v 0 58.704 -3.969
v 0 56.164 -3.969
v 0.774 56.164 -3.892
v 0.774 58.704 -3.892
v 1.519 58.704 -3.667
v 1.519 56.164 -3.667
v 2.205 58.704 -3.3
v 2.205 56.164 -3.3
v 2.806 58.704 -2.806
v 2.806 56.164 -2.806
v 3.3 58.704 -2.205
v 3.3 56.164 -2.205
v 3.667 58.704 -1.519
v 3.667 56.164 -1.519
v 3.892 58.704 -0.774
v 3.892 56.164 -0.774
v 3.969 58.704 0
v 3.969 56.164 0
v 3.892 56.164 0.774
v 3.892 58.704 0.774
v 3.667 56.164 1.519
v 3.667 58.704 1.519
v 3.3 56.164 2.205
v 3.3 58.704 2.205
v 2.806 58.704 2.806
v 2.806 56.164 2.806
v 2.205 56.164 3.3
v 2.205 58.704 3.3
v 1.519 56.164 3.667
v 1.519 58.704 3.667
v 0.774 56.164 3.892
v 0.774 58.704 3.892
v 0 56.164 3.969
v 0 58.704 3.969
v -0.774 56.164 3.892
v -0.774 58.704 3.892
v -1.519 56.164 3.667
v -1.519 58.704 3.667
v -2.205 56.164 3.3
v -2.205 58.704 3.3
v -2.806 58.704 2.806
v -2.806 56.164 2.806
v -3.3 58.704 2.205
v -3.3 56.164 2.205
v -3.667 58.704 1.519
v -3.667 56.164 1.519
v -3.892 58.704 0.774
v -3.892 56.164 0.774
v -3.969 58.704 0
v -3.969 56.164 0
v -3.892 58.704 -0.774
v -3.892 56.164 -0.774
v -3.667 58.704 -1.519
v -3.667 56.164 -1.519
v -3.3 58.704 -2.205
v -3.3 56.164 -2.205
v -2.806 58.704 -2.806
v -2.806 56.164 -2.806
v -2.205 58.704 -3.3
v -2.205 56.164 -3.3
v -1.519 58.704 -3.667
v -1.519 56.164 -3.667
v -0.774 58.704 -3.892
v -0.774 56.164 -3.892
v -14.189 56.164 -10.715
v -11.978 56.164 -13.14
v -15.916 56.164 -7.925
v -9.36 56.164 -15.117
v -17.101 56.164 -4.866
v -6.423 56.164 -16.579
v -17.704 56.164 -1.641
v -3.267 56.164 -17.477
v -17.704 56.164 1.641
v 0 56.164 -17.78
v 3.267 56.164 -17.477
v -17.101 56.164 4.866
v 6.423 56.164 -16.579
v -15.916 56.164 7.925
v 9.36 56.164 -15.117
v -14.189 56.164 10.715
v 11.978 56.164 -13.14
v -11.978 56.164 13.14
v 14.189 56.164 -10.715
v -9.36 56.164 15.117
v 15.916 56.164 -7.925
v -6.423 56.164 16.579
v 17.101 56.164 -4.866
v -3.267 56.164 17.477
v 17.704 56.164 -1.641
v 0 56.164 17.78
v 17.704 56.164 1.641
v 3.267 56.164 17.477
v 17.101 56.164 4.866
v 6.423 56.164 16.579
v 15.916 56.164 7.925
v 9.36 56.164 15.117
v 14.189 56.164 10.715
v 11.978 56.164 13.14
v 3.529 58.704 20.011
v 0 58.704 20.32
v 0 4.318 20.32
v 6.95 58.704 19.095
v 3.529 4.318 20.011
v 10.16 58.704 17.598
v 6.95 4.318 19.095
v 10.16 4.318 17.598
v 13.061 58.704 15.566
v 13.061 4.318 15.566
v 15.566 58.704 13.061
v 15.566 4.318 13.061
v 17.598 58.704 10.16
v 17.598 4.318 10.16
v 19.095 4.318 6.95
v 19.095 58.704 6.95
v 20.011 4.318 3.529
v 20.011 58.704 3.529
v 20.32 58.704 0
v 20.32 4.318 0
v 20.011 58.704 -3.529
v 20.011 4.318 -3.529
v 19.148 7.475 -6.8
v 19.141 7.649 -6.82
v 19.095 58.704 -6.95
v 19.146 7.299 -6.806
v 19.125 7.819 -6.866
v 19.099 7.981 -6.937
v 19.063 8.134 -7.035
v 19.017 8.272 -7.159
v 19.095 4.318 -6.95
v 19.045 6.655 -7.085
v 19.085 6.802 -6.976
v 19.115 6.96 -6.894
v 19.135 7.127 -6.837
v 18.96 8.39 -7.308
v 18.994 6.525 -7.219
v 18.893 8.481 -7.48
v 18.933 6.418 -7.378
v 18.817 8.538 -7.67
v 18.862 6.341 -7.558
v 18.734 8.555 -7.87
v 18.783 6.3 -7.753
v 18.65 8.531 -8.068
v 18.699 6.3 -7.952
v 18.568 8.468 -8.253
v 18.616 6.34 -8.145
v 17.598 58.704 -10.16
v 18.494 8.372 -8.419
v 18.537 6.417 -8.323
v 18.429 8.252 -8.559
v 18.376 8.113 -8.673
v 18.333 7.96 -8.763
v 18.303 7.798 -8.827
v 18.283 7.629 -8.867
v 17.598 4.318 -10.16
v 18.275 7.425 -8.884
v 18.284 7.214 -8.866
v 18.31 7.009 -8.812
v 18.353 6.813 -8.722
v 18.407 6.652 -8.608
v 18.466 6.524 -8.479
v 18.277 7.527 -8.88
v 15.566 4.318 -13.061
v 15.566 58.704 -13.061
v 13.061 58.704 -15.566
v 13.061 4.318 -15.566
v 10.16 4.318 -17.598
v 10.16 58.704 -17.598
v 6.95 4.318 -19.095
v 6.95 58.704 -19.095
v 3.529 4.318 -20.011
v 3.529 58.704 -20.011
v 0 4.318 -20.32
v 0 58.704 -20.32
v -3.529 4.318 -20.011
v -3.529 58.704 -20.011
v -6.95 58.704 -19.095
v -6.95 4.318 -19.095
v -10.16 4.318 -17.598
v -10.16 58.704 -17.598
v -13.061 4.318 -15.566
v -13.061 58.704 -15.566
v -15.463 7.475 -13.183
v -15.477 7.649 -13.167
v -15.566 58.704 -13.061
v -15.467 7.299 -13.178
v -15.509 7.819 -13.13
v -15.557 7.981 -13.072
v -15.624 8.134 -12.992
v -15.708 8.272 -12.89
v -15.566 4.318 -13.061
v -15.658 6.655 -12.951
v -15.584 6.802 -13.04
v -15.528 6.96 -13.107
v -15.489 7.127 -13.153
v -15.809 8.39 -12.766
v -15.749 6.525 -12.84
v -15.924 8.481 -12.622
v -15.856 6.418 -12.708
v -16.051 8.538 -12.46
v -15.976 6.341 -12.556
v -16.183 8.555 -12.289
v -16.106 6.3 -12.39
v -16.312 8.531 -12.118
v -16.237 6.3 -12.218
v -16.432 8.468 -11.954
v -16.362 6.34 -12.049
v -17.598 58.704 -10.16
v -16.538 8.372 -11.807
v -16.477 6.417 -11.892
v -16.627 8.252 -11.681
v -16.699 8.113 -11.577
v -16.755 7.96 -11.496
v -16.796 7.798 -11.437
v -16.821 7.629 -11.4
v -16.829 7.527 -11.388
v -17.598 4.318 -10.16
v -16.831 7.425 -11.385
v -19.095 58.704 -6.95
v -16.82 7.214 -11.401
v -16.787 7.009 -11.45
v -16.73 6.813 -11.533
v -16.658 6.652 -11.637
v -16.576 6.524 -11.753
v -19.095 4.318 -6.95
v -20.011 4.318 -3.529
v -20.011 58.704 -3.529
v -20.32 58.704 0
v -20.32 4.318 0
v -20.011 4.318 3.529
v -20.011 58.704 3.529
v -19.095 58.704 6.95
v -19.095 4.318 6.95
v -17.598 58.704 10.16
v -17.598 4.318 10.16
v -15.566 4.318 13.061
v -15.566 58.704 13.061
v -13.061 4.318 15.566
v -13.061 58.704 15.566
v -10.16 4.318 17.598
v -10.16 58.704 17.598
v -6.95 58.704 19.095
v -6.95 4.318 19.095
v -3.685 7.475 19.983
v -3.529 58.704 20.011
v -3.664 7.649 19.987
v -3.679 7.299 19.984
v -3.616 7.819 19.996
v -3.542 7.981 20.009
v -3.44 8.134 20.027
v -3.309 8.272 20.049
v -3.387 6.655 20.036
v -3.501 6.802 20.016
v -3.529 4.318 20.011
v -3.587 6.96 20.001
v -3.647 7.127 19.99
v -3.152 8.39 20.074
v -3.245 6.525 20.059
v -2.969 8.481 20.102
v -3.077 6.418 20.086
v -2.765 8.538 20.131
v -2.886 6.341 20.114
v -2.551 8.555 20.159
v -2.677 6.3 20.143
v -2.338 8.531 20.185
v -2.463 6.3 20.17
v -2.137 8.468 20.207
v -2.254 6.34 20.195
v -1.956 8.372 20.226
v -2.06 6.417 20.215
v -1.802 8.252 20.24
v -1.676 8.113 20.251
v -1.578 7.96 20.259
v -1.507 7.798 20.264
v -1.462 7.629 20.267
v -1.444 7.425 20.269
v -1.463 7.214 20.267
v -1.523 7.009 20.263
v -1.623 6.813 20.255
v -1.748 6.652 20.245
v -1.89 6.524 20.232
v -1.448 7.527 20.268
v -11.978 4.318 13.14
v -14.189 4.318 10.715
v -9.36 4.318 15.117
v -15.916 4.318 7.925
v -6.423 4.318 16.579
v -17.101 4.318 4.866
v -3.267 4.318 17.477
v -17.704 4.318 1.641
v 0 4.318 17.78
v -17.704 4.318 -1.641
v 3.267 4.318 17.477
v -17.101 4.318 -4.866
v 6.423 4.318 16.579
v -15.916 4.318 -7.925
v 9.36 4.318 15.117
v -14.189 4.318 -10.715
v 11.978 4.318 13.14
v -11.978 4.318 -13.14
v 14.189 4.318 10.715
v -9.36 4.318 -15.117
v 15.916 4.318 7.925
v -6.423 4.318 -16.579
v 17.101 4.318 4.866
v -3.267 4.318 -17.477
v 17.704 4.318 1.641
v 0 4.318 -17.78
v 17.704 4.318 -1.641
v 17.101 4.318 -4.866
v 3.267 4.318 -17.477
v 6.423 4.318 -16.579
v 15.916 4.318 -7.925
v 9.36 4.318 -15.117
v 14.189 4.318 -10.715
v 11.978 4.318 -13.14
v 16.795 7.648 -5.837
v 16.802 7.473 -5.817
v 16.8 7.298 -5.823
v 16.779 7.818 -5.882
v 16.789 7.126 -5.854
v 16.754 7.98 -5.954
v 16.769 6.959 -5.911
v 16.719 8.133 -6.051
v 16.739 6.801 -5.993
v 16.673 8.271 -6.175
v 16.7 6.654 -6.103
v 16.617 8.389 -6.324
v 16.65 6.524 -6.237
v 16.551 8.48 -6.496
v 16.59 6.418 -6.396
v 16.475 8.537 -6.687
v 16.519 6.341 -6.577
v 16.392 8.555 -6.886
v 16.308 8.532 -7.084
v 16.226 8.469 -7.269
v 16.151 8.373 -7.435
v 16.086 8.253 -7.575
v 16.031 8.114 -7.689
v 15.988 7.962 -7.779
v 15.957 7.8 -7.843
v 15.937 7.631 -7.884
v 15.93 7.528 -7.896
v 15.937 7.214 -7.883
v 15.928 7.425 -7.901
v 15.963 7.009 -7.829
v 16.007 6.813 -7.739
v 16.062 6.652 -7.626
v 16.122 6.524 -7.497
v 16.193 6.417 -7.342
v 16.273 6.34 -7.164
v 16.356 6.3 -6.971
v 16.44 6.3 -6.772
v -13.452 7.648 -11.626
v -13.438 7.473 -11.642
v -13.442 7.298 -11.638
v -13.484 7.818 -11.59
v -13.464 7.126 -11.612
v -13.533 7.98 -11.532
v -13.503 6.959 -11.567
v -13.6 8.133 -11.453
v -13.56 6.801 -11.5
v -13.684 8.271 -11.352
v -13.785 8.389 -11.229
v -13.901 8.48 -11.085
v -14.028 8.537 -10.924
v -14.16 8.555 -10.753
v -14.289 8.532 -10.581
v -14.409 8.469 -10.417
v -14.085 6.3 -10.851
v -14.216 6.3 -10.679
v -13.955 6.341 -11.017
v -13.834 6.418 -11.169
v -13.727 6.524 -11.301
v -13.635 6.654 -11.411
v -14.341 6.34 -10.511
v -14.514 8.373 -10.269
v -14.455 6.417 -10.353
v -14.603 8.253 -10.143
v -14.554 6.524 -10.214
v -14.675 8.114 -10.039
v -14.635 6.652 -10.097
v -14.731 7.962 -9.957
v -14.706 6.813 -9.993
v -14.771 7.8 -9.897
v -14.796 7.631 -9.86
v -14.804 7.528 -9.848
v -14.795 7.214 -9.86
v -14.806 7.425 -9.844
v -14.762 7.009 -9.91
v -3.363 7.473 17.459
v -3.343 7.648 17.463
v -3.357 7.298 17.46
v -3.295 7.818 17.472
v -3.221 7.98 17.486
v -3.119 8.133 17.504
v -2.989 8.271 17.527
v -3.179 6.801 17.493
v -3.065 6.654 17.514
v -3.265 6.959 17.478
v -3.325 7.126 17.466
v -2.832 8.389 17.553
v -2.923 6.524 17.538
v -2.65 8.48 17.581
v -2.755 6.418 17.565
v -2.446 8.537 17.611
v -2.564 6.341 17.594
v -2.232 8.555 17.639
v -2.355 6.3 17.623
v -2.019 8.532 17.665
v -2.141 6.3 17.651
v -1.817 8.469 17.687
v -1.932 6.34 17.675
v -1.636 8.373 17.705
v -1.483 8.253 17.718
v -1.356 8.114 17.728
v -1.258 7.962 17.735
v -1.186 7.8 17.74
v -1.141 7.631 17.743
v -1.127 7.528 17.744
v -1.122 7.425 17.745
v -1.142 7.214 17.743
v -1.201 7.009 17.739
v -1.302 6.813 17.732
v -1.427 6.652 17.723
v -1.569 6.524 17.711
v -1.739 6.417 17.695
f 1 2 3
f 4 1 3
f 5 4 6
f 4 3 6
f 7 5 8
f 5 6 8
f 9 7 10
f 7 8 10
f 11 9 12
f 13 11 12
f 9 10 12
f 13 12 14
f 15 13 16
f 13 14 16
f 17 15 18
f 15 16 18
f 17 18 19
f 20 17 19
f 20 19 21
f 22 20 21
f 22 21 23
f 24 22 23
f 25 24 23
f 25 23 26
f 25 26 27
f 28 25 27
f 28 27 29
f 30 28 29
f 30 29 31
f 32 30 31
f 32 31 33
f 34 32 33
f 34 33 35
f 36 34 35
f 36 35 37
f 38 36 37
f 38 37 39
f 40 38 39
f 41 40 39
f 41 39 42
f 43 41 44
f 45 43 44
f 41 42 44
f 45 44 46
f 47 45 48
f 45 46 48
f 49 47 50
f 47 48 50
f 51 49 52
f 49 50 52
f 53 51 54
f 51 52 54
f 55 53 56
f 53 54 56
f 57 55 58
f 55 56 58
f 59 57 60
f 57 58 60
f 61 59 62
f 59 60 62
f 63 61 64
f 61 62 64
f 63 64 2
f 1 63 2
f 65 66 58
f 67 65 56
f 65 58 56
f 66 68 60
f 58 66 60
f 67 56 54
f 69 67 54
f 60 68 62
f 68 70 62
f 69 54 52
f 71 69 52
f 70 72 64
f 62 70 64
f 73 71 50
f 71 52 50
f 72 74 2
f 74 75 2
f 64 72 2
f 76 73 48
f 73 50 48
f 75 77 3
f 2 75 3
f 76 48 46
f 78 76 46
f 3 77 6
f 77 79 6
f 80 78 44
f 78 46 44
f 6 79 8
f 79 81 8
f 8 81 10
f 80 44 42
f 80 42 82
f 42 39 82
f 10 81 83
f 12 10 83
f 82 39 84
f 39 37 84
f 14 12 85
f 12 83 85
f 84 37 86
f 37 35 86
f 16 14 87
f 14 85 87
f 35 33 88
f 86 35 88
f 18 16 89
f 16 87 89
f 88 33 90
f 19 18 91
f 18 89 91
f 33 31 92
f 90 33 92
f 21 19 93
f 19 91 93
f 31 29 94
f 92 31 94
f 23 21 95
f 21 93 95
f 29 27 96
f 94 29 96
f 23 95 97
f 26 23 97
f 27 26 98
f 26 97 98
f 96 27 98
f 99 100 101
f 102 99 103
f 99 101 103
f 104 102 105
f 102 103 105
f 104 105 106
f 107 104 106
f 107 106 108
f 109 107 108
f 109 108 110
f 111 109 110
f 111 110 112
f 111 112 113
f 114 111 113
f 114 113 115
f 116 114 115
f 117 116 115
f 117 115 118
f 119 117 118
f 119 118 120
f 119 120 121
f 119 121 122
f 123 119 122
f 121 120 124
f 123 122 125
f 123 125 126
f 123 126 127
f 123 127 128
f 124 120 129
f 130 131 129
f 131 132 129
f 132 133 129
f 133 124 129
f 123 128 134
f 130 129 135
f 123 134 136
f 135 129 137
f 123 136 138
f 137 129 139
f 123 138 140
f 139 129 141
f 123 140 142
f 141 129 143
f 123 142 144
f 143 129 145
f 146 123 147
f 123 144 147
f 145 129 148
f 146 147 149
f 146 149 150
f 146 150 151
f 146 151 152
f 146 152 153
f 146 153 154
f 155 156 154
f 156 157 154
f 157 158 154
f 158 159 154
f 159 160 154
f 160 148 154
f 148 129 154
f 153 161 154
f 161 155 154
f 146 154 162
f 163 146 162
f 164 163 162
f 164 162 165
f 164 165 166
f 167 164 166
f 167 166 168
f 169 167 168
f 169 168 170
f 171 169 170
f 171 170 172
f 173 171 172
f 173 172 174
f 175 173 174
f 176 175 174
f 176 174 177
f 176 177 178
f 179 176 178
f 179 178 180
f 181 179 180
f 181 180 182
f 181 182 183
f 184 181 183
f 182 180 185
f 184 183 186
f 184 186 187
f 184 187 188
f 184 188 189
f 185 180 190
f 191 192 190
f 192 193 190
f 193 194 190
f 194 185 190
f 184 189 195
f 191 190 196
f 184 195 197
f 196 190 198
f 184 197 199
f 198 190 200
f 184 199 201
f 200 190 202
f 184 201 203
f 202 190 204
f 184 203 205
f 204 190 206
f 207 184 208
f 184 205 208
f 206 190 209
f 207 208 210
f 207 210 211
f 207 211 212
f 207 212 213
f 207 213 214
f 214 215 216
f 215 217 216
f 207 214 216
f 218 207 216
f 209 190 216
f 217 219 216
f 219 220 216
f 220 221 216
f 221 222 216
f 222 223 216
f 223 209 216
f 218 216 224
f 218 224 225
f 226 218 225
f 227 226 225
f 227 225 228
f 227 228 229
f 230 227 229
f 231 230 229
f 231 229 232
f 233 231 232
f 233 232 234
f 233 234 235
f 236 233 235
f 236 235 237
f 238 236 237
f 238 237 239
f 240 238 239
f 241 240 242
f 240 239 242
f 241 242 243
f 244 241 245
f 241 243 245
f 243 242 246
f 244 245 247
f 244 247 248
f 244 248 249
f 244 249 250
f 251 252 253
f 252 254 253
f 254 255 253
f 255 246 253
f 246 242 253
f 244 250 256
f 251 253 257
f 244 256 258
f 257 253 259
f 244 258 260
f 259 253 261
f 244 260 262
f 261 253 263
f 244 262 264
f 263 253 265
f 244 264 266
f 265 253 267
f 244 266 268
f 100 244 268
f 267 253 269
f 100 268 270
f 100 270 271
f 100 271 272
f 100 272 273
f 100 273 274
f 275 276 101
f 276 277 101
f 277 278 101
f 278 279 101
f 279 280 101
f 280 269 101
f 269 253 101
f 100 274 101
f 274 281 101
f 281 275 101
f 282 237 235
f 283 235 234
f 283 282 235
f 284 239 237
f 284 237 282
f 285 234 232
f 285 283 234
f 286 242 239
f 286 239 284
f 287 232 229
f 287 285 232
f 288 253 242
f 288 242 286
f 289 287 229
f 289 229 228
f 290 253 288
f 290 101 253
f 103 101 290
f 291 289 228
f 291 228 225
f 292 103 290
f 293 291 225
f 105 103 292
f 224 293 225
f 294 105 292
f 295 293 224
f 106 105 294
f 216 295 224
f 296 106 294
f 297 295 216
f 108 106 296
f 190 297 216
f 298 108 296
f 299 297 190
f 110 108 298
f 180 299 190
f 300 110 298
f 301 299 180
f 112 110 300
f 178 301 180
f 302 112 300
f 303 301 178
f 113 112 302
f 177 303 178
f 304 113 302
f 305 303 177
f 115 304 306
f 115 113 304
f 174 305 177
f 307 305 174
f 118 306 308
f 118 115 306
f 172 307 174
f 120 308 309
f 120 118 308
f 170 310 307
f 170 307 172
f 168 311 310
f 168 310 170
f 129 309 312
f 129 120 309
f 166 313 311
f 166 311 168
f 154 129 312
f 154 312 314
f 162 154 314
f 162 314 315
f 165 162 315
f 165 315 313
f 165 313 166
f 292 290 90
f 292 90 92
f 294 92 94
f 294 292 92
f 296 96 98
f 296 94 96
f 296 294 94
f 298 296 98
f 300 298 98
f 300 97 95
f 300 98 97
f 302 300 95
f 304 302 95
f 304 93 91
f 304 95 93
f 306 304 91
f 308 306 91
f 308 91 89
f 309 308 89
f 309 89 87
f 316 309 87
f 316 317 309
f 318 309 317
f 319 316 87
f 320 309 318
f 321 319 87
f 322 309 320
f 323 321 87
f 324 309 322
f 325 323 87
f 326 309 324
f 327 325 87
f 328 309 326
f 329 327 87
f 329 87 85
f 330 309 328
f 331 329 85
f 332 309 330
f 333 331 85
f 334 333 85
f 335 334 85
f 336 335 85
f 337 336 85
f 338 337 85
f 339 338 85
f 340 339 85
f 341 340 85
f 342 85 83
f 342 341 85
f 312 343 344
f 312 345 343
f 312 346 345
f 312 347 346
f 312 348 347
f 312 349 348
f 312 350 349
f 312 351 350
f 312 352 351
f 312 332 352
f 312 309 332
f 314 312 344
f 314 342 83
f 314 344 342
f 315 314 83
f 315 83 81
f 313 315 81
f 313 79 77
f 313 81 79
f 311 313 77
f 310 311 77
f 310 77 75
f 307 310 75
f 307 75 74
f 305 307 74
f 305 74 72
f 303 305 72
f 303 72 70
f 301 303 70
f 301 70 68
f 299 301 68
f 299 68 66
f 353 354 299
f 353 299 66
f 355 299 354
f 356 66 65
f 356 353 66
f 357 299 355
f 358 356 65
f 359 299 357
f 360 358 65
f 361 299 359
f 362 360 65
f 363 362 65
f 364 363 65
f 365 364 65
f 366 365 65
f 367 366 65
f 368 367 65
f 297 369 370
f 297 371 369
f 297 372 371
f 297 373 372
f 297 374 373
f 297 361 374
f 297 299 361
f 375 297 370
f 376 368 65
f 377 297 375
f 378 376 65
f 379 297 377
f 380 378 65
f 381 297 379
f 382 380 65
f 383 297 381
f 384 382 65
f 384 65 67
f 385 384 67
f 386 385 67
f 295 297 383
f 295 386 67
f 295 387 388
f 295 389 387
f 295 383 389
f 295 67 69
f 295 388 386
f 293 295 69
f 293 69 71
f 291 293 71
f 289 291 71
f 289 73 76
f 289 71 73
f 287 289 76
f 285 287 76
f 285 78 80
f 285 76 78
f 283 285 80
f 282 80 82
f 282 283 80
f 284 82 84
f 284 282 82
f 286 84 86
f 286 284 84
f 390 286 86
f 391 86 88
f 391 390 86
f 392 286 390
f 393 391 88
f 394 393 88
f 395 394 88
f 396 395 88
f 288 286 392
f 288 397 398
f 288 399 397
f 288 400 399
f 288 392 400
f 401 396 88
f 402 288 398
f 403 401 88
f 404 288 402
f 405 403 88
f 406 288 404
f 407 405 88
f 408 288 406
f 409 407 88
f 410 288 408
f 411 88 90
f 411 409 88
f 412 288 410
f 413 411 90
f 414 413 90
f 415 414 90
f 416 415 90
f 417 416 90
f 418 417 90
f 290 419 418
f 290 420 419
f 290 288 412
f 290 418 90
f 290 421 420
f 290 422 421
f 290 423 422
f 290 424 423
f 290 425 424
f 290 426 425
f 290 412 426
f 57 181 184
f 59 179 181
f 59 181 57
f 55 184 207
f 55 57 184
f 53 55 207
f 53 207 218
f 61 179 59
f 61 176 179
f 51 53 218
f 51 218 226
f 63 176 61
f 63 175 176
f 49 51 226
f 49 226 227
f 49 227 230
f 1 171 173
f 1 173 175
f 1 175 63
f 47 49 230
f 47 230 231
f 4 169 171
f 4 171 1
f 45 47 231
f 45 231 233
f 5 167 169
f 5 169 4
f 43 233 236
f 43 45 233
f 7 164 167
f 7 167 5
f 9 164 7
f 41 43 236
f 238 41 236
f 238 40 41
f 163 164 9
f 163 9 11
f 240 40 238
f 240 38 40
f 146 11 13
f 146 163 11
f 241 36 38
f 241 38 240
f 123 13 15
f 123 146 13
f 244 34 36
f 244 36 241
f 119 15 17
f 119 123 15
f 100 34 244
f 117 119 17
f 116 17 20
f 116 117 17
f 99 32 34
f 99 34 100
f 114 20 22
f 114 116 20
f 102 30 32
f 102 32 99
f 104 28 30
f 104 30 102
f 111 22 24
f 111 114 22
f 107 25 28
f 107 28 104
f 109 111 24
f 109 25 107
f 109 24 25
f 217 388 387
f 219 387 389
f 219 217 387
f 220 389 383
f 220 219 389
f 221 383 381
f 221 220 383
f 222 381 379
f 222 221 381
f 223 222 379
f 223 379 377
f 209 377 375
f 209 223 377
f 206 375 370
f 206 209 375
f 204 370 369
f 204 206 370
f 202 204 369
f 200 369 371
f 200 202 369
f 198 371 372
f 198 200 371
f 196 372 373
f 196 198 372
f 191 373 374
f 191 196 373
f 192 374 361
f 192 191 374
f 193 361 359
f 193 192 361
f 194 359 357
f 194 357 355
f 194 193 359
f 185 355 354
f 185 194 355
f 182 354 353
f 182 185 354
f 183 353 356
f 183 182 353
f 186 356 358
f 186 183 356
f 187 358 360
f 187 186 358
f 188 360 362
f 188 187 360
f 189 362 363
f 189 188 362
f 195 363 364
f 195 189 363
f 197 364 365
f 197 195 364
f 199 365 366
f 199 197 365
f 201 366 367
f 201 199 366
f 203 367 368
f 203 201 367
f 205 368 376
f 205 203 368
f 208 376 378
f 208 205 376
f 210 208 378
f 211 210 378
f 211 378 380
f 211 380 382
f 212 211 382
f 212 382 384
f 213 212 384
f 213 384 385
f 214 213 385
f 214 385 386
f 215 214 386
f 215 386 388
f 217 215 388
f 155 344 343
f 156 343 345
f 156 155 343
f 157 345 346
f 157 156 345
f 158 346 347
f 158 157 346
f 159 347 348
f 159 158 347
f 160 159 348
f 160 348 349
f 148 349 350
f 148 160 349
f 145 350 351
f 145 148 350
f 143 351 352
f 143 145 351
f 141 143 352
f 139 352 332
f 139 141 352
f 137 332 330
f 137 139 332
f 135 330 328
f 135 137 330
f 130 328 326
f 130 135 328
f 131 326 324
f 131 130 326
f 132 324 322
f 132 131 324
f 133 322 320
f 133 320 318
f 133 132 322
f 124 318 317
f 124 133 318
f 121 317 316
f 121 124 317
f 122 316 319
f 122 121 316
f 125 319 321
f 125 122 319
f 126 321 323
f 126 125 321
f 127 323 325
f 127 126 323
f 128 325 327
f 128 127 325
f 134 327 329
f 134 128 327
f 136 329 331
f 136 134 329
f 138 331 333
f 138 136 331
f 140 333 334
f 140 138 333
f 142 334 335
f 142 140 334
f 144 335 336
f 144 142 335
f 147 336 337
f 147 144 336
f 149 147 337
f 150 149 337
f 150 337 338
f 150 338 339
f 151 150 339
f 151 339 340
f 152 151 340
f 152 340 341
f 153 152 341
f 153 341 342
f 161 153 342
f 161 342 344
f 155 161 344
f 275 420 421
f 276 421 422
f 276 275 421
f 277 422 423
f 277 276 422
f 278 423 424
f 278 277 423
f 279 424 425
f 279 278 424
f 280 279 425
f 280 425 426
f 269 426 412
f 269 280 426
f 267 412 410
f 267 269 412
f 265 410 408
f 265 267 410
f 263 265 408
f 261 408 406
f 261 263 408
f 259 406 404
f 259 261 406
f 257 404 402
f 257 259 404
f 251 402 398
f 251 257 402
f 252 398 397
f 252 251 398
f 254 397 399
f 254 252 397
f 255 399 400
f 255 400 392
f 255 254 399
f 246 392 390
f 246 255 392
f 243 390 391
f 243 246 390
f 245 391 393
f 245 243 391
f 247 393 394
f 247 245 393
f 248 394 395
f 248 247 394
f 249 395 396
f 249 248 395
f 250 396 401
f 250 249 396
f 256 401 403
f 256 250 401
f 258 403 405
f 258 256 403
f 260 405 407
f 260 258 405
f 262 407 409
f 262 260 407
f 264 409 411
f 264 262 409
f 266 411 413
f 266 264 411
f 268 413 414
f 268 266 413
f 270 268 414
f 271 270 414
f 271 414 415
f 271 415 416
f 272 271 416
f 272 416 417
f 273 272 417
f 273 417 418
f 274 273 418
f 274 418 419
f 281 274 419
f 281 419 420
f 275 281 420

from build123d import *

# Parameters (mm, degrees)
SKETCH1_R           = 20.32
BOSS_EXTRUDE1_DEPTH = 58.70448
SHELL1_T            = -2.54
SKETCH2_R           = 3.96875
CUT_EXTRUDE1_DEPTH  = 64.089251174
CIRPATTERN1_COUNT   = 3
SKETCH9_R           = 20.32
CUT_EXTRUDE2_DEPTH  = 4.318


with BuildPart() as part:
    # Sketch1 → Boss-Extrude1 (new body)
    with BuildSketch(Plane(origin=(0, 0, 0), x_dir=(1, 0, 0), z_dir=(0, 1, 0))):
        with Locations(Location((0, 0, 0), (0, 0, 270))):
            Circle(SKETCH1_R)
    extrude(amount=BOSS_EXTRUDE1_DEPTH)

    # Shell1
    shell1_openings = [part.faces().sort_by_distance(p)[0] for p in [
        (0, 0, 0),
    ]]
    offset(amount=SHELL1_T, openings=shell1_openings, kind=Kind.INTERSECTION)

    # Sketch2 → Cut-Extrude1 (cut, through all)
    with BuildSketch(Plane.XZ.offset(-56.16448)):
        with Locations(Location((0, 0, 0), (0, 0, 270))):
            Circle(SKETCH2_R)
    extrude(amount=-CUT_EXTRUDE1_DEPTH, mode=Mode.SUBTRACT)

    # Sketch8 → #2 Clearance Hole1 (revolve, cut)
    with BuildSketch(Plane(origin=(-2.56879902, 7.424974445, 20.156975755), x_dir=(0.9919771533037619, 0, 0.1264172746240199), z_dir=(0, 1, 0))):
        Polygon((0, 0), (0, 9.838434313), (1.1303, 8.89), (1.1303, 0), align=None)
    f_2_clearance_hole1 = revolve(axis=Axis((-3.371548714, 7.424974445, 26.456030679), (0.1264172746240199, 0, -0.9919771533037619)), mode=Mode.SUBTRACT)

    # CirPattern1: #2 Clearance Hole1 ×3 about axis
    cirpattern1_axis = Axis((0, 58.70448, 0), (0, -1, 0))
    for i in range(1, CIRPATTERN1_COUNT):
        add(f_2_clearance_hole1.rotate(cirpattern1_axis, i * 360 / CIRPATTERN1_COUNT), mode=Mode.SUBTRACT)

    # Sketch9 → Cut-Extrude2 (cut)
    with BuildSketch(Plane.XZ):
        with Locations(Location((0, 0, 0), (0, 0, 270))):
            Circle(SKETCH9_R)
    extrude(amount=-CUT_EXTRUDE2_DEPTH, mode=Mode.SUBTRACT)


solid = part.part
